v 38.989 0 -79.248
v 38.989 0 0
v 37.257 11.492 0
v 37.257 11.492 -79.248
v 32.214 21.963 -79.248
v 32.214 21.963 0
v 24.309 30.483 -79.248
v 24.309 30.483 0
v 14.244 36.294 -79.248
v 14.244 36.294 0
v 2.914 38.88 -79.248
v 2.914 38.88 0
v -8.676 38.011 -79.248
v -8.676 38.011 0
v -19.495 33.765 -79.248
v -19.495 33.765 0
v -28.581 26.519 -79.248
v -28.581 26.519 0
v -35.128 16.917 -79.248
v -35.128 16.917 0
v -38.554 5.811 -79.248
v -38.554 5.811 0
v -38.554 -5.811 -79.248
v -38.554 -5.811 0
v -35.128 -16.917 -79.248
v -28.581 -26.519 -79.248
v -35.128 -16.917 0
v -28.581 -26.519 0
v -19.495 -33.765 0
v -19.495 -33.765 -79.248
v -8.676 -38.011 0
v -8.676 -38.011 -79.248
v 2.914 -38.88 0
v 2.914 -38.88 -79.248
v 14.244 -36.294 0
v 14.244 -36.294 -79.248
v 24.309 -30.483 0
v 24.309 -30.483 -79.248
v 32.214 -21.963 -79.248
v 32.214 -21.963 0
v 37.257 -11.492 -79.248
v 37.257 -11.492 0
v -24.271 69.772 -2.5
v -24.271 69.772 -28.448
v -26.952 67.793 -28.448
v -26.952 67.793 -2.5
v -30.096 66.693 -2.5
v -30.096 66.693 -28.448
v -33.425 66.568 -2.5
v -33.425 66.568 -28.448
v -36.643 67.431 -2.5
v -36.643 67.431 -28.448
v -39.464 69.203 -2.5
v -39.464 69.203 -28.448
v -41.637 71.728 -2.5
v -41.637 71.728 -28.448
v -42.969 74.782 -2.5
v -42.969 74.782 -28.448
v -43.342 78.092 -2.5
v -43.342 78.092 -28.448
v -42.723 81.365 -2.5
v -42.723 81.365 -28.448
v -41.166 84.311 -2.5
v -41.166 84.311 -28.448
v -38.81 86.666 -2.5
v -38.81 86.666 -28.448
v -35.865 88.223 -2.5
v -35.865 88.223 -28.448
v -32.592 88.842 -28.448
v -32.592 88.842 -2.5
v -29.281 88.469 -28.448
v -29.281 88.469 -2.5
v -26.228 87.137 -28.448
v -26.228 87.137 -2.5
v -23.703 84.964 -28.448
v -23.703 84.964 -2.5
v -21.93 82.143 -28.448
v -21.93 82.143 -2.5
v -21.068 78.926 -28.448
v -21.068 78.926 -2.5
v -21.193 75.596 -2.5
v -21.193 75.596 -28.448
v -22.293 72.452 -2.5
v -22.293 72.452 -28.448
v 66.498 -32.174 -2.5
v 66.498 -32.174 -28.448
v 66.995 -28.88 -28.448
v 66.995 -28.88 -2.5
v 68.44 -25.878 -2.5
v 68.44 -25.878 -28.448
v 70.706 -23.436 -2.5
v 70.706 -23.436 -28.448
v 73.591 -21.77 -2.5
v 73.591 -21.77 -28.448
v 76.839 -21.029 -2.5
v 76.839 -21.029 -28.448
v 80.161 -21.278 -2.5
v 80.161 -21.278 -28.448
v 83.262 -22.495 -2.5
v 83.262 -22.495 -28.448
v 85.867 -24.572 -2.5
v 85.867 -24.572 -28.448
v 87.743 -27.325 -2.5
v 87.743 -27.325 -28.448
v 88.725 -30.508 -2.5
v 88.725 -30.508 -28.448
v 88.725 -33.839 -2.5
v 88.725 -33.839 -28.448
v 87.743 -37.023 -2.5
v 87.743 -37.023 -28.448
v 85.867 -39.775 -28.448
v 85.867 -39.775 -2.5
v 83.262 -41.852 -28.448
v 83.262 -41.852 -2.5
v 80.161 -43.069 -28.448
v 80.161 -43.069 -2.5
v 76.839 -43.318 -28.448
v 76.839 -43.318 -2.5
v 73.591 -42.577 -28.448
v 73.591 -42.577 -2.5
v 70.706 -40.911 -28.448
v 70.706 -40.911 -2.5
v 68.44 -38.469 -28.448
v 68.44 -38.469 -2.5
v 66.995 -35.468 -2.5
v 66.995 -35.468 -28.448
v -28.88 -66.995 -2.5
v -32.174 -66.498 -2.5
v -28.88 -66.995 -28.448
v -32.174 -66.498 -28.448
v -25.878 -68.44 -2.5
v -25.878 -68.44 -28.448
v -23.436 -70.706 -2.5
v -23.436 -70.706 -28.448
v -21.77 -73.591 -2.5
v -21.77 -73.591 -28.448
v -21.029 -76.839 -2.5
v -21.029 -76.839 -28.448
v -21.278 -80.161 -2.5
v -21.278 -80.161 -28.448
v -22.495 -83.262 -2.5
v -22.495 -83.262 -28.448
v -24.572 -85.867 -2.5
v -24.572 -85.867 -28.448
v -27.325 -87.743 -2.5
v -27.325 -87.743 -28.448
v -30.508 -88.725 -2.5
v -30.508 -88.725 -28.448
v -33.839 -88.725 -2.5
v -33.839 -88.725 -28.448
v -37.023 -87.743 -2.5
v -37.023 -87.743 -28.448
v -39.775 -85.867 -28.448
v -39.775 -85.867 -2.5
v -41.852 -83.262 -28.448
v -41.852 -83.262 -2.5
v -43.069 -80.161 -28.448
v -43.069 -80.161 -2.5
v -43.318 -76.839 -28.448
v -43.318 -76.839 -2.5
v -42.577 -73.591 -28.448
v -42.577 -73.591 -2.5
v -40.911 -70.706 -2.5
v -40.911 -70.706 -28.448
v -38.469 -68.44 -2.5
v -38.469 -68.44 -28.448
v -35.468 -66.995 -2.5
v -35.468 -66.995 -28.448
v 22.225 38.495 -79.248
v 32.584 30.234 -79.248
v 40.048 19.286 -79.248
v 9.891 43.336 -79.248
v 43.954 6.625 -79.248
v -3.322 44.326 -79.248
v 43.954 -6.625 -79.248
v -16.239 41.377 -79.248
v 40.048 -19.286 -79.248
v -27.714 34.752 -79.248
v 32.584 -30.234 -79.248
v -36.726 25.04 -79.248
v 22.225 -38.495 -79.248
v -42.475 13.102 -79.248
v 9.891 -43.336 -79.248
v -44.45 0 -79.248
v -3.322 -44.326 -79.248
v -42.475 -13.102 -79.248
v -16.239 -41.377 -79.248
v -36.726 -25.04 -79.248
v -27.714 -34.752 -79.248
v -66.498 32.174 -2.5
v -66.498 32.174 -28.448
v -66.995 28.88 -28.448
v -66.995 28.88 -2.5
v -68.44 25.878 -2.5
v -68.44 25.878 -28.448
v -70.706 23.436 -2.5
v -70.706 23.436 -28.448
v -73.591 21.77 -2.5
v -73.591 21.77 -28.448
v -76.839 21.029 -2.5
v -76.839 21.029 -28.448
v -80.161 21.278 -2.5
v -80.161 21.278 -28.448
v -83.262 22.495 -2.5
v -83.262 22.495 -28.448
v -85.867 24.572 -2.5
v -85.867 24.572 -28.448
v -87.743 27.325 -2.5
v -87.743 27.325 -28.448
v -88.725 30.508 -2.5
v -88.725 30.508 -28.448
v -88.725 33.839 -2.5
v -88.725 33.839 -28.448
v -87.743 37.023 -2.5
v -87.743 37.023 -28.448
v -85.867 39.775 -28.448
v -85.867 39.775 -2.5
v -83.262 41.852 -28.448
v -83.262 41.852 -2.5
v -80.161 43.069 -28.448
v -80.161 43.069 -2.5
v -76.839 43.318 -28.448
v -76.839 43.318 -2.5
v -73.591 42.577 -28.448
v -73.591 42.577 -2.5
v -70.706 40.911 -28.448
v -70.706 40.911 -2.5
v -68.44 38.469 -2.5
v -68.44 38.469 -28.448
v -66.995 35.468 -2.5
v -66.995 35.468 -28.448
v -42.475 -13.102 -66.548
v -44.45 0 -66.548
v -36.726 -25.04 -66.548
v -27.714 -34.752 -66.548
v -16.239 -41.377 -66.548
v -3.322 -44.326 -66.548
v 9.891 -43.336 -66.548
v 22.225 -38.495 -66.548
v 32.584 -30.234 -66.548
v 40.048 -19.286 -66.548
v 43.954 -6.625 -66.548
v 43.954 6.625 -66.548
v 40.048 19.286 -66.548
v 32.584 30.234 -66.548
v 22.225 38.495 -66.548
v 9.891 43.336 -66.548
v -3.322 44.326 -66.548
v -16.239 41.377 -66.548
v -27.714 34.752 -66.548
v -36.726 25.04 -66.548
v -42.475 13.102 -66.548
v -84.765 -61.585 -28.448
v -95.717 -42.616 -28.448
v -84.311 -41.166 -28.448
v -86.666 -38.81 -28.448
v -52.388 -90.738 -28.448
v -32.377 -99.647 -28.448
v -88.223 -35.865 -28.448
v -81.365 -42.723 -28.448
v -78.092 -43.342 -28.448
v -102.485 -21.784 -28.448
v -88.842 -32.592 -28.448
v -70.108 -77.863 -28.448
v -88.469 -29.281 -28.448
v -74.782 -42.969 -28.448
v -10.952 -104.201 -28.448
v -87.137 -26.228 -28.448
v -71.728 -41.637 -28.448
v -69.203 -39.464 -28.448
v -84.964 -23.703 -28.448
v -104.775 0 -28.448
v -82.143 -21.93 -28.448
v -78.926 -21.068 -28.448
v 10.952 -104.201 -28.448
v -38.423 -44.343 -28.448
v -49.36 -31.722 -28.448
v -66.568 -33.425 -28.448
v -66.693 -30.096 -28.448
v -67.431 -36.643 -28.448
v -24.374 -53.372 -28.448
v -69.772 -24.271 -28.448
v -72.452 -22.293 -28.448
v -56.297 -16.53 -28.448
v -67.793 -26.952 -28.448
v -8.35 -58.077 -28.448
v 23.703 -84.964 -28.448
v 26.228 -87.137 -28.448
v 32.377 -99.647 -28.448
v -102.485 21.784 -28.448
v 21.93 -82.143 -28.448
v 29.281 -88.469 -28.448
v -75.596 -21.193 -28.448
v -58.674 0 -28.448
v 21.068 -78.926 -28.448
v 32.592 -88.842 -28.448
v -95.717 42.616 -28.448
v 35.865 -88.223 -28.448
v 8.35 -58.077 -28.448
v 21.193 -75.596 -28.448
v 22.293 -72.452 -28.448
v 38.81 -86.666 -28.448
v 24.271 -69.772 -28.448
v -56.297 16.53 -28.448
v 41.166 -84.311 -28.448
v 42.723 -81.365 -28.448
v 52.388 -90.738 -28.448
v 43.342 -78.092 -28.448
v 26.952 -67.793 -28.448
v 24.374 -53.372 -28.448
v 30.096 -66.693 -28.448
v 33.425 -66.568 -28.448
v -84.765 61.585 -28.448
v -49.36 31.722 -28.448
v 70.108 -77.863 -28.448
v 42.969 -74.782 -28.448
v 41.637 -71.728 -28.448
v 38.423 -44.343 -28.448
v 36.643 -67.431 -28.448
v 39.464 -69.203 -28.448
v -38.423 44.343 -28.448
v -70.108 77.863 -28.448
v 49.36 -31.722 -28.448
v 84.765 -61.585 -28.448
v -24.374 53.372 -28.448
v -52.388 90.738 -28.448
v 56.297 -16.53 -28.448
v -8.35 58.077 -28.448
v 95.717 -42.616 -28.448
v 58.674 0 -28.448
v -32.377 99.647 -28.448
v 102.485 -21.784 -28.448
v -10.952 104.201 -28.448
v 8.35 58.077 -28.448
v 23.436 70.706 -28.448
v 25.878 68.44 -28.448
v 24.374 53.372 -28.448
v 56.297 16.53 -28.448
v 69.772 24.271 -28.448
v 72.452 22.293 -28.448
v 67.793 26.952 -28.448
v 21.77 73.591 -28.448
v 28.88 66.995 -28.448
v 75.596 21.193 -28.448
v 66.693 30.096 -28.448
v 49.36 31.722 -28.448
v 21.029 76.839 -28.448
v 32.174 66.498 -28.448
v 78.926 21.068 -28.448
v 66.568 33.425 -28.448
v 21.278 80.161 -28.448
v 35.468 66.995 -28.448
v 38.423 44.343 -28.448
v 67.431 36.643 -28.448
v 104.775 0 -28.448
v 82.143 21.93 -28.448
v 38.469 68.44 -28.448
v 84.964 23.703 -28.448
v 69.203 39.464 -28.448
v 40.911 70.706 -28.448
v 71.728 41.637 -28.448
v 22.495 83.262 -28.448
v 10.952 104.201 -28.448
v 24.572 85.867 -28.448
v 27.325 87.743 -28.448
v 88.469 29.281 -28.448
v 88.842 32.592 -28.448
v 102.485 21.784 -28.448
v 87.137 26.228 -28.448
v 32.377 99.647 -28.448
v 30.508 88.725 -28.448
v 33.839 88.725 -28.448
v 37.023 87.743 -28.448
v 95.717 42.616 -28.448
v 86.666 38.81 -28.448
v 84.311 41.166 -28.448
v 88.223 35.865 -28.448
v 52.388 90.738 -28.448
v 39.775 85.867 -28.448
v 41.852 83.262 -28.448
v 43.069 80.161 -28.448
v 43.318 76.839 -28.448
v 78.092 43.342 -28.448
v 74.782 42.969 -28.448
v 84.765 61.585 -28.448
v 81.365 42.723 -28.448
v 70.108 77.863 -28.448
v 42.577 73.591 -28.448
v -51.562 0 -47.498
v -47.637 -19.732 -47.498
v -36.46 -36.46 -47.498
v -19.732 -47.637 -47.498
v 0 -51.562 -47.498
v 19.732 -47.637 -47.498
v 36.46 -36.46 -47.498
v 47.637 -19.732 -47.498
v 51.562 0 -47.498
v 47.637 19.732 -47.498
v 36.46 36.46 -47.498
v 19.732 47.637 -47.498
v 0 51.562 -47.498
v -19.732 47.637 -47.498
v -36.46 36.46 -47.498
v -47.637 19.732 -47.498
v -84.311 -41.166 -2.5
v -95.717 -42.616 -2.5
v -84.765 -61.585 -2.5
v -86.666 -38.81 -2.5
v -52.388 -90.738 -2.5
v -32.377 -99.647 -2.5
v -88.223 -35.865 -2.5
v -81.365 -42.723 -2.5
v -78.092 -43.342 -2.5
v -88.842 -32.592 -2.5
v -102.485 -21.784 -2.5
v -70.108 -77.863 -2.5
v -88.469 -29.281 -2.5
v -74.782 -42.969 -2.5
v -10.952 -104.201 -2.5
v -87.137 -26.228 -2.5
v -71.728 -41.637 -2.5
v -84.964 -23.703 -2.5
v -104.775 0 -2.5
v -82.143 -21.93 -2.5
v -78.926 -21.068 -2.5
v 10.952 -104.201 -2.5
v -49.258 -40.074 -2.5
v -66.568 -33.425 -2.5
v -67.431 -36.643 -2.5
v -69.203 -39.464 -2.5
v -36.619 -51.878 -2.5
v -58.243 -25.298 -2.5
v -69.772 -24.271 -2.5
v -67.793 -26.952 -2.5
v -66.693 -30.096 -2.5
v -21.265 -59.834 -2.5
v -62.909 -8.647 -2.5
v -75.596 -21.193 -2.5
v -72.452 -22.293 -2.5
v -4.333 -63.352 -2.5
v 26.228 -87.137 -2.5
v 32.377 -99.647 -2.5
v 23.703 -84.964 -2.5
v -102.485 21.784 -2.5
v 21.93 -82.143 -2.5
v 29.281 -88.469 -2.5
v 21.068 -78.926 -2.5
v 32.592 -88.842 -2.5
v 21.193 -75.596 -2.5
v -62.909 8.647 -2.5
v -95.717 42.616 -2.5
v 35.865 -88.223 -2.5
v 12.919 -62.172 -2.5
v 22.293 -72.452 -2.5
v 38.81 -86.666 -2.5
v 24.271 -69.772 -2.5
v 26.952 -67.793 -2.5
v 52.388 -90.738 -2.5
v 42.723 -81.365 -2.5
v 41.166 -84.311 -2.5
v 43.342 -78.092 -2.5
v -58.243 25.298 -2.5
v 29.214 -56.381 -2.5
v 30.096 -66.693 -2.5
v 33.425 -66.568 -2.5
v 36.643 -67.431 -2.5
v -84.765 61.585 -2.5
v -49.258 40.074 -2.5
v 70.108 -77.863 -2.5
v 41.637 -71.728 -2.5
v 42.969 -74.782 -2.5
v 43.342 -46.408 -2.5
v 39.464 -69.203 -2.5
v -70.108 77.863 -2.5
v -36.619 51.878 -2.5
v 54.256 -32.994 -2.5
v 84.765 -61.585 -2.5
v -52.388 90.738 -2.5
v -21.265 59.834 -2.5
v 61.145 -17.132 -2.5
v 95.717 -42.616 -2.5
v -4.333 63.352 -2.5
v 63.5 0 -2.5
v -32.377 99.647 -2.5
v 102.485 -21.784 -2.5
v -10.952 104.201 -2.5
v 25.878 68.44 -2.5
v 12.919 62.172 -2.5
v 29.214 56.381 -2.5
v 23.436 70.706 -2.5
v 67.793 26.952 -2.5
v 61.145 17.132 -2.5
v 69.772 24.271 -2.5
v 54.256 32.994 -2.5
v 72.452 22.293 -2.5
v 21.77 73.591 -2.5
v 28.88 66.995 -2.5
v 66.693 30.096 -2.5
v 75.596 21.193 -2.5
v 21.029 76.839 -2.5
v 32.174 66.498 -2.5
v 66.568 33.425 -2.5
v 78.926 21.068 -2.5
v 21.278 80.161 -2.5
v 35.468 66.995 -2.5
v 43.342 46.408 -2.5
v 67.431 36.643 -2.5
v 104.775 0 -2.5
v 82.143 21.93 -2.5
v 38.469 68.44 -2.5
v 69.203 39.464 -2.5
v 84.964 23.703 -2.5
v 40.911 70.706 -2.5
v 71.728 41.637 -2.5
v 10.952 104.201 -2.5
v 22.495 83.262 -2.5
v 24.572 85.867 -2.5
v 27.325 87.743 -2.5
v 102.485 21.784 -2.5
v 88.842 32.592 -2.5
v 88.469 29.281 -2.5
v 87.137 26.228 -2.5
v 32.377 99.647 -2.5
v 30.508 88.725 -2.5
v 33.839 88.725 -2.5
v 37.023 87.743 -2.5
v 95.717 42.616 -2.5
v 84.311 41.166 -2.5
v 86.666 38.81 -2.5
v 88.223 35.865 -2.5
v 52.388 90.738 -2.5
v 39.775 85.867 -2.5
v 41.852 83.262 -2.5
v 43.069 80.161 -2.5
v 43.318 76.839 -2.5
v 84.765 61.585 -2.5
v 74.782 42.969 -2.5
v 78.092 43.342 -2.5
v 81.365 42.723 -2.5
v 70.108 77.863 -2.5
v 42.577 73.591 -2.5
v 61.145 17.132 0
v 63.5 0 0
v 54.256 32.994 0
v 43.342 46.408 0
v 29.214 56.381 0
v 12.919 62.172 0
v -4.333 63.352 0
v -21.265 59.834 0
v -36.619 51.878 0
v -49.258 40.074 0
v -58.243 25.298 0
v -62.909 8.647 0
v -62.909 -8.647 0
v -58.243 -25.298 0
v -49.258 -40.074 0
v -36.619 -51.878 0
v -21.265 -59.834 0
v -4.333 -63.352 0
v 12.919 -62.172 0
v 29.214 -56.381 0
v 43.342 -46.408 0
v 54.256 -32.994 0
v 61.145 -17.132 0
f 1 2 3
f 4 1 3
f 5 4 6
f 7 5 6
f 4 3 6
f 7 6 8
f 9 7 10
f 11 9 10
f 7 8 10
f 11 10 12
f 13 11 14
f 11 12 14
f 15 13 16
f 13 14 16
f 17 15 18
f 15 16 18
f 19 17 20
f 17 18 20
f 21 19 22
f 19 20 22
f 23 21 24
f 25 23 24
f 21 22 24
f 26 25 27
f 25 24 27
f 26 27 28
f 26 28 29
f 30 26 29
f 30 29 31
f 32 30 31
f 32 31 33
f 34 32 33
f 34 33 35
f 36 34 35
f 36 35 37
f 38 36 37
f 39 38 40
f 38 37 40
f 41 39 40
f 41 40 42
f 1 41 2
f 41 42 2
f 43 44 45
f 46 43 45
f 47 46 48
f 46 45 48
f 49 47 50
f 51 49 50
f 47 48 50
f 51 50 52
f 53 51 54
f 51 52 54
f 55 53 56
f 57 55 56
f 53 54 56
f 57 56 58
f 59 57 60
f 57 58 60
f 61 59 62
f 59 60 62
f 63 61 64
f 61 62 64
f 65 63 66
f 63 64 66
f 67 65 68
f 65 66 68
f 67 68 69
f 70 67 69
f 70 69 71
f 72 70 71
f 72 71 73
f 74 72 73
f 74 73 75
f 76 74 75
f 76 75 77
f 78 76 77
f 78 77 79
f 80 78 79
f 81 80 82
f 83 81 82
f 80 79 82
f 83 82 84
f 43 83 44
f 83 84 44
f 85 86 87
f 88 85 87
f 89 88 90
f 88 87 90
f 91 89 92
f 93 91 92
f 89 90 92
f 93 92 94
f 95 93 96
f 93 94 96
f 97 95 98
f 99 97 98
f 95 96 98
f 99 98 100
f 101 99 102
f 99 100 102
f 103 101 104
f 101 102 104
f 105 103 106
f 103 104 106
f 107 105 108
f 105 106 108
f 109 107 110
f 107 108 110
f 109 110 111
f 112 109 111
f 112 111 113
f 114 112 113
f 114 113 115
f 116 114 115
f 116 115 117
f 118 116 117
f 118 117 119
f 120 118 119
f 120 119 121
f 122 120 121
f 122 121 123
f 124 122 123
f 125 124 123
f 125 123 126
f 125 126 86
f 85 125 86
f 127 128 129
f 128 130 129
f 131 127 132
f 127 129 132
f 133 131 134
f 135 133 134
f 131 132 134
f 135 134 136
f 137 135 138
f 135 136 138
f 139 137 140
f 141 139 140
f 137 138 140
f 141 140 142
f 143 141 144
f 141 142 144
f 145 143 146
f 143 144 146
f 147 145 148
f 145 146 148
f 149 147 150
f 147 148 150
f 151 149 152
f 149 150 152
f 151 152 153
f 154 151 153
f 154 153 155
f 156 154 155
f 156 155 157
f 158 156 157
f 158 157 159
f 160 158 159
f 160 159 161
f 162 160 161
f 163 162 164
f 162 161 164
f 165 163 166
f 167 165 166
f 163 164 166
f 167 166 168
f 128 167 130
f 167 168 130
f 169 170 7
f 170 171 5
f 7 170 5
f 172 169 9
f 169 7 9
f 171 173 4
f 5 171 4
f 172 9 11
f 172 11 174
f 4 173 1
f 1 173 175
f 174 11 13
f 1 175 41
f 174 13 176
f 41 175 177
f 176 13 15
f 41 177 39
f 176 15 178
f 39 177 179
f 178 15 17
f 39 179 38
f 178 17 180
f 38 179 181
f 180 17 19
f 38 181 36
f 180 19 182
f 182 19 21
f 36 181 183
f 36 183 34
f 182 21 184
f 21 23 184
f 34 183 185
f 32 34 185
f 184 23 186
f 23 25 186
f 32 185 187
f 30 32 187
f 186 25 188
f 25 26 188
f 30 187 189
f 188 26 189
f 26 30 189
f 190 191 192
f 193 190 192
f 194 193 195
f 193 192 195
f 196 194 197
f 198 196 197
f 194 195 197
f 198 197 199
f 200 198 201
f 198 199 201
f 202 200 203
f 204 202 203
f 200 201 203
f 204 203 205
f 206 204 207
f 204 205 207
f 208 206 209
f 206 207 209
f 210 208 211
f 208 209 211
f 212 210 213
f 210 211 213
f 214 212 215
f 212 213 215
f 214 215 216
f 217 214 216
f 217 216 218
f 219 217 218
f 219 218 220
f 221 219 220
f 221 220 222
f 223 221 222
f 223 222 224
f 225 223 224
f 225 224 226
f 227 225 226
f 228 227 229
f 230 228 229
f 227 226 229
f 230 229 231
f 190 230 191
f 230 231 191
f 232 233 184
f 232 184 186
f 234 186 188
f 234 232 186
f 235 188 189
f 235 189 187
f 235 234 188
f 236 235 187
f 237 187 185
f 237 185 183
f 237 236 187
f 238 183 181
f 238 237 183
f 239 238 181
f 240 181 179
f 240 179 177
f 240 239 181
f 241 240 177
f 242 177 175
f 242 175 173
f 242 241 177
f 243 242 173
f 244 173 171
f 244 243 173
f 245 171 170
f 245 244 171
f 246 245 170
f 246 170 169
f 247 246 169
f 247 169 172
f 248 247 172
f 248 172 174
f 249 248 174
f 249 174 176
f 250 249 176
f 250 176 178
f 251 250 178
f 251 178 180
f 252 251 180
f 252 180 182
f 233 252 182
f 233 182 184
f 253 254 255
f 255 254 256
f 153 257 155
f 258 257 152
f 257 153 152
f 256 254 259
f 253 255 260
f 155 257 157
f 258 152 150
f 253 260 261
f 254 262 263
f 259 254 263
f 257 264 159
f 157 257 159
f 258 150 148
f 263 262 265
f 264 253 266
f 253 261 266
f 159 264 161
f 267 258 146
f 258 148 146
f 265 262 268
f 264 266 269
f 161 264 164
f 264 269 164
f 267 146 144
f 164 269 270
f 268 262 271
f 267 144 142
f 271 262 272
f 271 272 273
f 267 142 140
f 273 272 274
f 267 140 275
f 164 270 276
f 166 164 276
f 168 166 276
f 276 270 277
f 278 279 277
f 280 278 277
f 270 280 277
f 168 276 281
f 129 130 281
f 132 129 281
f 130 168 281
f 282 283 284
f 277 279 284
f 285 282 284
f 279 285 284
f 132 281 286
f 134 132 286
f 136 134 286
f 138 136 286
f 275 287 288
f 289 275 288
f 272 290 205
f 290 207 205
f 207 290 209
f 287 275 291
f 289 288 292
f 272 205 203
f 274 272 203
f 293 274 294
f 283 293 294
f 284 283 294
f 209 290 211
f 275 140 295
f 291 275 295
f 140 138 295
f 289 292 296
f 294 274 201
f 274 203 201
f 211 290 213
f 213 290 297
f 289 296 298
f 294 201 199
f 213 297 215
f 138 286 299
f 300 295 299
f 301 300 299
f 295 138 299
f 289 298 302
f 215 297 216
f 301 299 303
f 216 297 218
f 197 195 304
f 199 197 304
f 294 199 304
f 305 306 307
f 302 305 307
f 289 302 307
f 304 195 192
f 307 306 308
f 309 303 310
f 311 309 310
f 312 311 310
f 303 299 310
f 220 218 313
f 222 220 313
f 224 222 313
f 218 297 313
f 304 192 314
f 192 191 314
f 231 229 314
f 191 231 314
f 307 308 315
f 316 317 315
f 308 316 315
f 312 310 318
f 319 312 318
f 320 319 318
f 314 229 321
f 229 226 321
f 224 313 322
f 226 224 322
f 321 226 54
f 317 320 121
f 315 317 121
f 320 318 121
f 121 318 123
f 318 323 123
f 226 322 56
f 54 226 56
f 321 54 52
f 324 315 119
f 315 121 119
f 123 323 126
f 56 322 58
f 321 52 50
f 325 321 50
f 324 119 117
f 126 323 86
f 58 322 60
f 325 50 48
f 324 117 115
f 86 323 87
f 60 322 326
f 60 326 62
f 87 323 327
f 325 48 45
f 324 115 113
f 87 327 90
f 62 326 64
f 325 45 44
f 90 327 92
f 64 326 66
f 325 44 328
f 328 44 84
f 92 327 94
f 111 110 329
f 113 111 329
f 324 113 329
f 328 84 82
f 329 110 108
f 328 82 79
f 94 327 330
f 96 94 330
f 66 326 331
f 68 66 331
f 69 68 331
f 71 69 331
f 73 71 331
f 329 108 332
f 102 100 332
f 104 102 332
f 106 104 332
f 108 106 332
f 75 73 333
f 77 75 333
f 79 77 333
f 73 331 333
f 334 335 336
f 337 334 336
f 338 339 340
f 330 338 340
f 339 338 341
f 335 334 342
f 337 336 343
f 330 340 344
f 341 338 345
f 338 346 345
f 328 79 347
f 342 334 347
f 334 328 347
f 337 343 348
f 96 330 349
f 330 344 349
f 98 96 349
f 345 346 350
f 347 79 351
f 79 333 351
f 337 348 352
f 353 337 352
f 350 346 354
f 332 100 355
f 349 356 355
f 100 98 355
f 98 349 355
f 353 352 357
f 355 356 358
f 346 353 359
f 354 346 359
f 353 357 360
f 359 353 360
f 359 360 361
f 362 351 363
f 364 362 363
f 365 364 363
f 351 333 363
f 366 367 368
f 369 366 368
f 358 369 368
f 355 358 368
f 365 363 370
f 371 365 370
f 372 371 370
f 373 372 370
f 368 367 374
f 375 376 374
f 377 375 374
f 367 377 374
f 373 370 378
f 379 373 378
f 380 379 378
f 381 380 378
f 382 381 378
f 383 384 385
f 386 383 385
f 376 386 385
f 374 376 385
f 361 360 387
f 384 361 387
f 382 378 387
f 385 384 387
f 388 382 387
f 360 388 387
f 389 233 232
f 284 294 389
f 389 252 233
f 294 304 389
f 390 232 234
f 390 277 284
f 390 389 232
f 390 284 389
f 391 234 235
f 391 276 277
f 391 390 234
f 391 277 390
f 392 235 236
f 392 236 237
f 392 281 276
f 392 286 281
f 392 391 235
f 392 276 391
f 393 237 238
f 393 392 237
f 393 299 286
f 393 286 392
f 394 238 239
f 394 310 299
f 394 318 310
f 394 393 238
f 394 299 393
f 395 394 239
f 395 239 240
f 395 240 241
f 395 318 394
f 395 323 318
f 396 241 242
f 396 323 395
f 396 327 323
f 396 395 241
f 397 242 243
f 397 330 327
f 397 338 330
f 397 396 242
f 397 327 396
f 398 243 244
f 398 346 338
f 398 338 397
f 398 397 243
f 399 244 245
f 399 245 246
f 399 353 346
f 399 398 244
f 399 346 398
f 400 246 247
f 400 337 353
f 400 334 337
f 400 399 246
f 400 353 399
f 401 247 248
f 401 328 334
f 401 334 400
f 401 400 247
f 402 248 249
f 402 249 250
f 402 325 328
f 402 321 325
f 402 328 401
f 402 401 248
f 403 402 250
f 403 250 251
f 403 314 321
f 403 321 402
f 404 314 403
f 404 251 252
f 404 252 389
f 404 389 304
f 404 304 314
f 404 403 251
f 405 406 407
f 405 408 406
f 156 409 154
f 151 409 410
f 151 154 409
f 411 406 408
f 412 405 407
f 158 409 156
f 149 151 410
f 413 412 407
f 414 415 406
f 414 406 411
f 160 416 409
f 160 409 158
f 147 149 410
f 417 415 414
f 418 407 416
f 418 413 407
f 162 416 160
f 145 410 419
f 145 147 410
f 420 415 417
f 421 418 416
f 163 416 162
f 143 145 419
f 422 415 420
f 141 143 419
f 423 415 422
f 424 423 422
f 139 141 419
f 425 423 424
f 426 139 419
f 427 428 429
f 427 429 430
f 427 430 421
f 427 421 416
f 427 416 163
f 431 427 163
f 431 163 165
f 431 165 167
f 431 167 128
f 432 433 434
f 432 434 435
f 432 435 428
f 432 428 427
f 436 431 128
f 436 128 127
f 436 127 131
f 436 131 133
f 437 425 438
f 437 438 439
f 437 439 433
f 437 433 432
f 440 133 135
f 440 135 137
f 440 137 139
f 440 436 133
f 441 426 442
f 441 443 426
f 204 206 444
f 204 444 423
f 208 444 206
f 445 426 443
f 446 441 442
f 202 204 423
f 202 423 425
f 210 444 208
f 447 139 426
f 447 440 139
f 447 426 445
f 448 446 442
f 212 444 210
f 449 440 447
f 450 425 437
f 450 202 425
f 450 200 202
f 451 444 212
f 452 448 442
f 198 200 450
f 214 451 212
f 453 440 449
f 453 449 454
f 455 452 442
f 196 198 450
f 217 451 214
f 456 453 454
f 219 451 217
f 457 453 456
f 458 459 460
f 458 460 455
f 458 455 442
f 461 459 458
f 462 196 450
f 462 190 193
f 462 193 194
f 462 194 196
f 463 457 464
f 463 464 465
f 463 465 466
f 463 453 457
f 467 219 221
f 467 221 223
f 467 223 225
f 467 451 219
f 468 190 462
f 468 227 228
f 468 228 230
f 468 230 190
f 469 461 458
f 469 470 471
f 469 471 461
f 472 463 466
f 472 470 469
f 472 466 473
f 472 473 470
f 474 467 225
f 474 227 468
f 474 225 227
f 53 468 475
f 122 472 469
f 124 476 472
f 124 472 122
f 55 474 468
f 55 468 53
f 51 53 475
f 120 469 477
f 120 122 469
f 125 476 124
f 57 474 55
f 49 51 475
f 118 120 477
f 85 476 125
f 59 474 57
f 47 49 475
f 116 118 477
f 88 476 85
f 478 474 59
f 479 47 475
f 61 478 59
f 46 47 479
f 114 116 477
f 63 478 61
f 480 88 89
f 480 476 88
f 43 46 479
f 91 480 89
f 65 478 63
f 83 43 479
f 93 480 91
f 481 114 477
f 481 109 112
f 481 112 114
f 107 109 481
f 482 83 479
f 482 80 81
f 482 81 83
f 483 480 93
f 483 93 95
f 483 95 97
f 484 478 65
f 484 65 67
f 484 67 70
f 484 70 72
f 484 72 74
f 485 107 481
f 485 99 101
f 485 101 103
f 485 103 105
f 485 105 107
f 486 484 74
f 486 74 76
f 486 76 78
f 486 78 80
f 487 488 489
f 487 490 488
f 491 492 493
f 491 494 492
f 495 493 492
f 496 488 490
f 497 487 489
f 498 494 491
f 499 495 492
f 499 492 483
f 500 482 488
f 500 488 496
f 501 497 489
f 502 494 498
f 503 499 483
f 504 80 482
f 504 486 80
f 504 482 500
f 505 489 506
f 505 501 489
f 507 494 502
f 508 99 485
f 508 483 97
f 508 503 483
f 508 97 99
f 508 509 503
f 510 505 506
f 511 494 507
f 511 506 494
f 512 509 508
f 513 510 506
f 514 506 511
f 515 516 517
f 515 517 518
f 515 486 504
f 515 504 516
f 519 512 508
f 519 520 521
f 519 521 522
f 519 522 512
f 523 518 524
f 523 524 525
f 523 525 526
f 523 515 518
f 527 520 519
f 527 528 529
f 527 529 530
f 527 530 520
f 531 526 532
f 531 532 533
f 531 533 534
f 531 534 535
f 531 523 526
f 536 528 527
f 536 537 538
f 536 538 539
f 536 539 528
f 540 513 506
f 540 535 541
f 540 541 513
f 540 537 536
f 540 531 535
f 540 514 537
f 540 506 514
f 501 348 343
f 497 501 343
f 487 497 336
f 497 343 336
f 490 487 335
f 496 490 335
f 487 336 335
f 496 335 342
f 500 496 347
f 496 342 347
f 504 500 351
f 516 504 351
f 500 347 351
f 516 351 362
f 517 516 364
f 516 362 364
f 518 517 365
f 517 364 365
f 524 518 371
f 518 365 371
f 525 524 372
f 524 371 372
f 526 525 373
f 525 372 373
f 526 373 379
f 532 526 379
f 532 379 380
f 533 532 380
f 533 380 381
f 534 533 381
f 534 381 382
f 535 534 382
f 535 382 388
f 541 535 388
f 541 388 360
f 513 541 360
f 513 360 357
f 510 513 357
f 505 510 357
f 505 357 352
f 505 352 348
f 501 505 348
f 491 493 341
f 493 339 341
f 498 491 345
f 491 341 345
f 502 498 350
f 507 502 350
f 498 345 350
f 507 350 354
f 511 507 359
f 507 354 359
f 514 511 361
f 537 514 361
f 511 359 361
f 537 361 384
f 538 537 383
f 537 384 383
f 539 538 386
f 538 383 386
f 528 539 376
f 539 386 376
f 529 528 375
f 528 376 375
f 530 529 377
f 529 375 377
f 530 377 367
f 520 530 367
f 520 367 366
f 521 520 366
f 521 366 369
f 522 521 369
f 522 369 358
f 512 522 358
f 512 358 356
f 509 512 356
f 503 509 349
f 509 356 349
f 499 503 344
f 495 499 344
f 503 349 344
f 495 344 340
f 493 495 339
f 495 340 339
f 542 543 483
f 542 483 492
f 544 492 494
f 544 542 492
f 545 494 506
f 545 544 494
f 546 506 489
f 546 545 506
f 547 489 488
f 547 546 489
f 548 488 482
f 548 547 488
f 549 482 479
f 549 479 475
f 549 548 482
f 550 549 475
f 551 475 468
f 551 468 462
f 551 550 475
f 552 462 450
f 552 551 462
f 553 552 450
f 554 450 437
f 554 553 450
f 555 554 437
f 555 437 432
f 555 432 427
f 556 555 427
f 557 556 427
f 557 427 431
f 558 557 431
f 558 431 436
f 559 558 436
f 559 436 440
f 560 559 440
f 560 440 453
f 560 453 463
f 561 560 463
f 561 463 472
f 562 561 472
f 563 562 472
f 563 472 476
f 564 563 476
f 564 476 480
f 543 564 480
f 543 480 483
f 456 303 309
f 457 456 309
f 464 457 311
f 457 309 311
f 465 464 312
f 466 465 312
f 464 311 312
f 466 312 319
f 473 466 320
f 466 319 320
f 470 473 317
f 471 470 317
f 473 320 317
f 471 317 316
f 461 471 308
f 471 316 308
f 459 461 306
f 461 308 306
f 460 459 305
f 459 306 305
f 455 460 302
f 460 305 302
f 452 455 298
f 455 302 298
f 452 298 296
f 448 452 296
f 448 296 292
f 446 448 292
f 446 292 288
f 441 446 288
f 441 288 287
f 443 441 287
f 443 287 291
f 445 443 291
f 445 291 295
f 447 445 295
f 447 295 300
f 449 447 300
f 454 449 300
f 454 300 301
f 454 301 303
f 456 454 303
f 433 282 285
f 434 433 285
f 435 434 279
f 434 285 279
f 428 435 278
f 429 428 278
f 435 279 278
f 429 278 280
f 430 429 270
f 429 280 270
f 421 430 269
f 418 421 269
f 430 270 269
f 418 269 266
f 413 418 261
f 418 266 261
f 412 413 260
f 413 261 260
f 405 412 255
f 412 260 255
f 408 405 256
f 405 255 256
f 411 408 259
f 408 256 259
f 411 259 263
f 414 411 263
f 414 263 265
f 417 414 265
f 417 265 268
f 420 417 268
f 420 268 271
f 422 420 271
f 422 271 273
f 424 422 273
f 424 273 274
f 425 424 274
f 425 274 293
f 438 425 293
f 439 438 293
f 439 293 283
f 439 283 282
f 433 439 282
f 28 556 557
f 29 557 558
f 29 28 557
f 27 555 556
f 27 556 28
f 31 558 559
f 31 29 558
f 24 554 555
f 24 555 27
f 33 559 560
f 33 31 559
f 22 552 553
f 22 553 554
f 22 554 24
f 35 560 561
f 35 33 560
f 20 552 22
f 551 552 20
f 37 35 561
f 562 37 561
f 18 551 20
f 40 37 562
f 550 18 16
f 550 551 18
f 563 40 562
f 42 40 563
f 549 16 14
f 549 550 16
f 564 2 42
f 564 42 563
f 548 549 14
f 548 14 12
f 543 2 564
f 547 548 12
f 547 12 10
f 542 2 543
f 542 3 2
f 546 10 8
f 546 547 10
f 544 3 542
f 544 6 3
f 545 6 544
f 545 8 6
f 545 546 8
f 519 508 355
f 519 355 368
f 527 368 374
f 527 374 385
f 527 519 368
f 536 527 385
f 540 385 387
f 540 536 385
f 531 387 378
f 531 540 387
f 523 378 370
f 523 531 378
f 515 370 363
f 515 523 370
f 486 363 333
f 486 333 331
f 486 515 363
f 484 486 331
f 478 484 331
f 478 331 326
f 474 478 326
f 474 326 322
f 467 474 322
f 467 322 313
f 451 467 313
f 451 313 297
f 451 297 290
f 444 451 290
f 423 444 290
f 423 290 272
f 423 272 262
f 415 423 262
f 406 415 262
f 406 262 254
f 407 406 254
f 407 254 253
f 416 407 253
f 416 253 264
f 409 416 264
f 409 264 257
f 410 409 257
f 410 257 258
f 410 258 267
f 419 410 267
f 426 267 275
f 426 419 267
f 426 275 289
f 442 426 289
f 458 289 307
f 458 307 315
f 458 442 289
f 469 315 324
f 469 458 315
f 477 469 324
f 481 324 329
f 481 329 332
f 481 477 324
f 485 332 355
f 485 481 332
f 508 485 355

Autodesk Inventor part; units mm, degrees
ref_plane "YZ Plane" through (0, 0, 0) normal (1, 0, 0) x (0, 1, 0)
ref_plane "XZ Plane" through (0, 0, 0) normal (0, 1, 0) x (-1, 0, 0)
ref_plane "XY Plane" through (0, 0, 0) normal (0, 0, 1) x (1, 0, 0)
sketch "Sketch1" plane through (0, 0, 0) normal (0, 0, 1) x (1, 0, 0)
  circle A0 centre (0, 0) radius 104.775
  dimension "d_externo" = 209.55
extrude "Diametro externo" add sketch "Sketch1" against normal blind 28.448
sketch "Sketch2" plane through (0, 0, 0) normal (0, 0, 1) x (1, 0, 0)
  circle A0 centre (0, 0) radius 104.775 projected
  circle A1 centre (0, 0) radius 63.5
  dimension "d_resaltado" = 127
extrude "Resaltado" cut sketch "Sketch2" against normal blind 2.5
sketch "Sketch3" plane through (0, 0, 0) normal (0, 1, 0) x (-1, 0, 0)
  line L0 (-104.775, -28.448) -> (104.775, -28.448) construction
  line L1 (63.5, 0) -> (-63.5, 0) construction
  line L2 (0, -83.82) -> (0, 13.97) projected
  line L3 (0, -28.448) -> (0, -79.248)
  line L4 (0, -79.248) -> (44.45, -79.248)
  line L5 (44.45, -79.248) -> (44.45, -66.548)
  line L6 (44.45, -66.548) -> (58.674, -28.448)
  line L7 (58.674, -28.448) -> (0, -28.448)
  point P0 (0, 0)
  point P1 (0, -28.448)
  point P2 (0, -79.248)
  dimension "dia_a" = 88.9
  dimension "dia_m" = 117.348
  dimension "d8" = 12.7
  dimension "altura_h" = 79.248
revolve "Cuello" add sketch "Sketch3" angle 360 about axis through (0, 0, -10) along (0, 0, 1)
sketch "Sketch4" plane through (0, 0, 0) normal (0, 0, 1) x (1, 0, 0)
  circle A0 centre (0, 0) radius 38.989
  dimension "d_interior" = 77.978
extrude "Diametro interior" cut sketch "Sketch4" against normal through all
sketch "Sketch5" plane through (0, 0, 0) normal (0, 0, 1) x (1, 0, 0)
  line L0 (0, -106.68) -> (0, 106.68) construction
  circle A0 centre (0, 0) radius 84.074 construction
  line L1 (0, 0) -> (32.1737, 77.6742) construction
  dimension "BCD" = 168.148
  dimension "ang_a1" = 22.5
hole "Agujero union" at (32.1737, 77.6742, 0) direction (0, 0, -1) diameter 22.352 end through all
pattern_circular "Patron agujero" count 8 over 360 about axis through (0, 0, -10) along (0, 0, 1) of "Agujero union"
sketch3d "Sketch6"
feature "RANURA_ORING:1" [suppressed]
equation "\"d8\" = -0.25 * espesor + 0.25 * altura_h"
equation "\"espesor\" = 28.448"
properties part number "ej_iLogic" material "Steel"
